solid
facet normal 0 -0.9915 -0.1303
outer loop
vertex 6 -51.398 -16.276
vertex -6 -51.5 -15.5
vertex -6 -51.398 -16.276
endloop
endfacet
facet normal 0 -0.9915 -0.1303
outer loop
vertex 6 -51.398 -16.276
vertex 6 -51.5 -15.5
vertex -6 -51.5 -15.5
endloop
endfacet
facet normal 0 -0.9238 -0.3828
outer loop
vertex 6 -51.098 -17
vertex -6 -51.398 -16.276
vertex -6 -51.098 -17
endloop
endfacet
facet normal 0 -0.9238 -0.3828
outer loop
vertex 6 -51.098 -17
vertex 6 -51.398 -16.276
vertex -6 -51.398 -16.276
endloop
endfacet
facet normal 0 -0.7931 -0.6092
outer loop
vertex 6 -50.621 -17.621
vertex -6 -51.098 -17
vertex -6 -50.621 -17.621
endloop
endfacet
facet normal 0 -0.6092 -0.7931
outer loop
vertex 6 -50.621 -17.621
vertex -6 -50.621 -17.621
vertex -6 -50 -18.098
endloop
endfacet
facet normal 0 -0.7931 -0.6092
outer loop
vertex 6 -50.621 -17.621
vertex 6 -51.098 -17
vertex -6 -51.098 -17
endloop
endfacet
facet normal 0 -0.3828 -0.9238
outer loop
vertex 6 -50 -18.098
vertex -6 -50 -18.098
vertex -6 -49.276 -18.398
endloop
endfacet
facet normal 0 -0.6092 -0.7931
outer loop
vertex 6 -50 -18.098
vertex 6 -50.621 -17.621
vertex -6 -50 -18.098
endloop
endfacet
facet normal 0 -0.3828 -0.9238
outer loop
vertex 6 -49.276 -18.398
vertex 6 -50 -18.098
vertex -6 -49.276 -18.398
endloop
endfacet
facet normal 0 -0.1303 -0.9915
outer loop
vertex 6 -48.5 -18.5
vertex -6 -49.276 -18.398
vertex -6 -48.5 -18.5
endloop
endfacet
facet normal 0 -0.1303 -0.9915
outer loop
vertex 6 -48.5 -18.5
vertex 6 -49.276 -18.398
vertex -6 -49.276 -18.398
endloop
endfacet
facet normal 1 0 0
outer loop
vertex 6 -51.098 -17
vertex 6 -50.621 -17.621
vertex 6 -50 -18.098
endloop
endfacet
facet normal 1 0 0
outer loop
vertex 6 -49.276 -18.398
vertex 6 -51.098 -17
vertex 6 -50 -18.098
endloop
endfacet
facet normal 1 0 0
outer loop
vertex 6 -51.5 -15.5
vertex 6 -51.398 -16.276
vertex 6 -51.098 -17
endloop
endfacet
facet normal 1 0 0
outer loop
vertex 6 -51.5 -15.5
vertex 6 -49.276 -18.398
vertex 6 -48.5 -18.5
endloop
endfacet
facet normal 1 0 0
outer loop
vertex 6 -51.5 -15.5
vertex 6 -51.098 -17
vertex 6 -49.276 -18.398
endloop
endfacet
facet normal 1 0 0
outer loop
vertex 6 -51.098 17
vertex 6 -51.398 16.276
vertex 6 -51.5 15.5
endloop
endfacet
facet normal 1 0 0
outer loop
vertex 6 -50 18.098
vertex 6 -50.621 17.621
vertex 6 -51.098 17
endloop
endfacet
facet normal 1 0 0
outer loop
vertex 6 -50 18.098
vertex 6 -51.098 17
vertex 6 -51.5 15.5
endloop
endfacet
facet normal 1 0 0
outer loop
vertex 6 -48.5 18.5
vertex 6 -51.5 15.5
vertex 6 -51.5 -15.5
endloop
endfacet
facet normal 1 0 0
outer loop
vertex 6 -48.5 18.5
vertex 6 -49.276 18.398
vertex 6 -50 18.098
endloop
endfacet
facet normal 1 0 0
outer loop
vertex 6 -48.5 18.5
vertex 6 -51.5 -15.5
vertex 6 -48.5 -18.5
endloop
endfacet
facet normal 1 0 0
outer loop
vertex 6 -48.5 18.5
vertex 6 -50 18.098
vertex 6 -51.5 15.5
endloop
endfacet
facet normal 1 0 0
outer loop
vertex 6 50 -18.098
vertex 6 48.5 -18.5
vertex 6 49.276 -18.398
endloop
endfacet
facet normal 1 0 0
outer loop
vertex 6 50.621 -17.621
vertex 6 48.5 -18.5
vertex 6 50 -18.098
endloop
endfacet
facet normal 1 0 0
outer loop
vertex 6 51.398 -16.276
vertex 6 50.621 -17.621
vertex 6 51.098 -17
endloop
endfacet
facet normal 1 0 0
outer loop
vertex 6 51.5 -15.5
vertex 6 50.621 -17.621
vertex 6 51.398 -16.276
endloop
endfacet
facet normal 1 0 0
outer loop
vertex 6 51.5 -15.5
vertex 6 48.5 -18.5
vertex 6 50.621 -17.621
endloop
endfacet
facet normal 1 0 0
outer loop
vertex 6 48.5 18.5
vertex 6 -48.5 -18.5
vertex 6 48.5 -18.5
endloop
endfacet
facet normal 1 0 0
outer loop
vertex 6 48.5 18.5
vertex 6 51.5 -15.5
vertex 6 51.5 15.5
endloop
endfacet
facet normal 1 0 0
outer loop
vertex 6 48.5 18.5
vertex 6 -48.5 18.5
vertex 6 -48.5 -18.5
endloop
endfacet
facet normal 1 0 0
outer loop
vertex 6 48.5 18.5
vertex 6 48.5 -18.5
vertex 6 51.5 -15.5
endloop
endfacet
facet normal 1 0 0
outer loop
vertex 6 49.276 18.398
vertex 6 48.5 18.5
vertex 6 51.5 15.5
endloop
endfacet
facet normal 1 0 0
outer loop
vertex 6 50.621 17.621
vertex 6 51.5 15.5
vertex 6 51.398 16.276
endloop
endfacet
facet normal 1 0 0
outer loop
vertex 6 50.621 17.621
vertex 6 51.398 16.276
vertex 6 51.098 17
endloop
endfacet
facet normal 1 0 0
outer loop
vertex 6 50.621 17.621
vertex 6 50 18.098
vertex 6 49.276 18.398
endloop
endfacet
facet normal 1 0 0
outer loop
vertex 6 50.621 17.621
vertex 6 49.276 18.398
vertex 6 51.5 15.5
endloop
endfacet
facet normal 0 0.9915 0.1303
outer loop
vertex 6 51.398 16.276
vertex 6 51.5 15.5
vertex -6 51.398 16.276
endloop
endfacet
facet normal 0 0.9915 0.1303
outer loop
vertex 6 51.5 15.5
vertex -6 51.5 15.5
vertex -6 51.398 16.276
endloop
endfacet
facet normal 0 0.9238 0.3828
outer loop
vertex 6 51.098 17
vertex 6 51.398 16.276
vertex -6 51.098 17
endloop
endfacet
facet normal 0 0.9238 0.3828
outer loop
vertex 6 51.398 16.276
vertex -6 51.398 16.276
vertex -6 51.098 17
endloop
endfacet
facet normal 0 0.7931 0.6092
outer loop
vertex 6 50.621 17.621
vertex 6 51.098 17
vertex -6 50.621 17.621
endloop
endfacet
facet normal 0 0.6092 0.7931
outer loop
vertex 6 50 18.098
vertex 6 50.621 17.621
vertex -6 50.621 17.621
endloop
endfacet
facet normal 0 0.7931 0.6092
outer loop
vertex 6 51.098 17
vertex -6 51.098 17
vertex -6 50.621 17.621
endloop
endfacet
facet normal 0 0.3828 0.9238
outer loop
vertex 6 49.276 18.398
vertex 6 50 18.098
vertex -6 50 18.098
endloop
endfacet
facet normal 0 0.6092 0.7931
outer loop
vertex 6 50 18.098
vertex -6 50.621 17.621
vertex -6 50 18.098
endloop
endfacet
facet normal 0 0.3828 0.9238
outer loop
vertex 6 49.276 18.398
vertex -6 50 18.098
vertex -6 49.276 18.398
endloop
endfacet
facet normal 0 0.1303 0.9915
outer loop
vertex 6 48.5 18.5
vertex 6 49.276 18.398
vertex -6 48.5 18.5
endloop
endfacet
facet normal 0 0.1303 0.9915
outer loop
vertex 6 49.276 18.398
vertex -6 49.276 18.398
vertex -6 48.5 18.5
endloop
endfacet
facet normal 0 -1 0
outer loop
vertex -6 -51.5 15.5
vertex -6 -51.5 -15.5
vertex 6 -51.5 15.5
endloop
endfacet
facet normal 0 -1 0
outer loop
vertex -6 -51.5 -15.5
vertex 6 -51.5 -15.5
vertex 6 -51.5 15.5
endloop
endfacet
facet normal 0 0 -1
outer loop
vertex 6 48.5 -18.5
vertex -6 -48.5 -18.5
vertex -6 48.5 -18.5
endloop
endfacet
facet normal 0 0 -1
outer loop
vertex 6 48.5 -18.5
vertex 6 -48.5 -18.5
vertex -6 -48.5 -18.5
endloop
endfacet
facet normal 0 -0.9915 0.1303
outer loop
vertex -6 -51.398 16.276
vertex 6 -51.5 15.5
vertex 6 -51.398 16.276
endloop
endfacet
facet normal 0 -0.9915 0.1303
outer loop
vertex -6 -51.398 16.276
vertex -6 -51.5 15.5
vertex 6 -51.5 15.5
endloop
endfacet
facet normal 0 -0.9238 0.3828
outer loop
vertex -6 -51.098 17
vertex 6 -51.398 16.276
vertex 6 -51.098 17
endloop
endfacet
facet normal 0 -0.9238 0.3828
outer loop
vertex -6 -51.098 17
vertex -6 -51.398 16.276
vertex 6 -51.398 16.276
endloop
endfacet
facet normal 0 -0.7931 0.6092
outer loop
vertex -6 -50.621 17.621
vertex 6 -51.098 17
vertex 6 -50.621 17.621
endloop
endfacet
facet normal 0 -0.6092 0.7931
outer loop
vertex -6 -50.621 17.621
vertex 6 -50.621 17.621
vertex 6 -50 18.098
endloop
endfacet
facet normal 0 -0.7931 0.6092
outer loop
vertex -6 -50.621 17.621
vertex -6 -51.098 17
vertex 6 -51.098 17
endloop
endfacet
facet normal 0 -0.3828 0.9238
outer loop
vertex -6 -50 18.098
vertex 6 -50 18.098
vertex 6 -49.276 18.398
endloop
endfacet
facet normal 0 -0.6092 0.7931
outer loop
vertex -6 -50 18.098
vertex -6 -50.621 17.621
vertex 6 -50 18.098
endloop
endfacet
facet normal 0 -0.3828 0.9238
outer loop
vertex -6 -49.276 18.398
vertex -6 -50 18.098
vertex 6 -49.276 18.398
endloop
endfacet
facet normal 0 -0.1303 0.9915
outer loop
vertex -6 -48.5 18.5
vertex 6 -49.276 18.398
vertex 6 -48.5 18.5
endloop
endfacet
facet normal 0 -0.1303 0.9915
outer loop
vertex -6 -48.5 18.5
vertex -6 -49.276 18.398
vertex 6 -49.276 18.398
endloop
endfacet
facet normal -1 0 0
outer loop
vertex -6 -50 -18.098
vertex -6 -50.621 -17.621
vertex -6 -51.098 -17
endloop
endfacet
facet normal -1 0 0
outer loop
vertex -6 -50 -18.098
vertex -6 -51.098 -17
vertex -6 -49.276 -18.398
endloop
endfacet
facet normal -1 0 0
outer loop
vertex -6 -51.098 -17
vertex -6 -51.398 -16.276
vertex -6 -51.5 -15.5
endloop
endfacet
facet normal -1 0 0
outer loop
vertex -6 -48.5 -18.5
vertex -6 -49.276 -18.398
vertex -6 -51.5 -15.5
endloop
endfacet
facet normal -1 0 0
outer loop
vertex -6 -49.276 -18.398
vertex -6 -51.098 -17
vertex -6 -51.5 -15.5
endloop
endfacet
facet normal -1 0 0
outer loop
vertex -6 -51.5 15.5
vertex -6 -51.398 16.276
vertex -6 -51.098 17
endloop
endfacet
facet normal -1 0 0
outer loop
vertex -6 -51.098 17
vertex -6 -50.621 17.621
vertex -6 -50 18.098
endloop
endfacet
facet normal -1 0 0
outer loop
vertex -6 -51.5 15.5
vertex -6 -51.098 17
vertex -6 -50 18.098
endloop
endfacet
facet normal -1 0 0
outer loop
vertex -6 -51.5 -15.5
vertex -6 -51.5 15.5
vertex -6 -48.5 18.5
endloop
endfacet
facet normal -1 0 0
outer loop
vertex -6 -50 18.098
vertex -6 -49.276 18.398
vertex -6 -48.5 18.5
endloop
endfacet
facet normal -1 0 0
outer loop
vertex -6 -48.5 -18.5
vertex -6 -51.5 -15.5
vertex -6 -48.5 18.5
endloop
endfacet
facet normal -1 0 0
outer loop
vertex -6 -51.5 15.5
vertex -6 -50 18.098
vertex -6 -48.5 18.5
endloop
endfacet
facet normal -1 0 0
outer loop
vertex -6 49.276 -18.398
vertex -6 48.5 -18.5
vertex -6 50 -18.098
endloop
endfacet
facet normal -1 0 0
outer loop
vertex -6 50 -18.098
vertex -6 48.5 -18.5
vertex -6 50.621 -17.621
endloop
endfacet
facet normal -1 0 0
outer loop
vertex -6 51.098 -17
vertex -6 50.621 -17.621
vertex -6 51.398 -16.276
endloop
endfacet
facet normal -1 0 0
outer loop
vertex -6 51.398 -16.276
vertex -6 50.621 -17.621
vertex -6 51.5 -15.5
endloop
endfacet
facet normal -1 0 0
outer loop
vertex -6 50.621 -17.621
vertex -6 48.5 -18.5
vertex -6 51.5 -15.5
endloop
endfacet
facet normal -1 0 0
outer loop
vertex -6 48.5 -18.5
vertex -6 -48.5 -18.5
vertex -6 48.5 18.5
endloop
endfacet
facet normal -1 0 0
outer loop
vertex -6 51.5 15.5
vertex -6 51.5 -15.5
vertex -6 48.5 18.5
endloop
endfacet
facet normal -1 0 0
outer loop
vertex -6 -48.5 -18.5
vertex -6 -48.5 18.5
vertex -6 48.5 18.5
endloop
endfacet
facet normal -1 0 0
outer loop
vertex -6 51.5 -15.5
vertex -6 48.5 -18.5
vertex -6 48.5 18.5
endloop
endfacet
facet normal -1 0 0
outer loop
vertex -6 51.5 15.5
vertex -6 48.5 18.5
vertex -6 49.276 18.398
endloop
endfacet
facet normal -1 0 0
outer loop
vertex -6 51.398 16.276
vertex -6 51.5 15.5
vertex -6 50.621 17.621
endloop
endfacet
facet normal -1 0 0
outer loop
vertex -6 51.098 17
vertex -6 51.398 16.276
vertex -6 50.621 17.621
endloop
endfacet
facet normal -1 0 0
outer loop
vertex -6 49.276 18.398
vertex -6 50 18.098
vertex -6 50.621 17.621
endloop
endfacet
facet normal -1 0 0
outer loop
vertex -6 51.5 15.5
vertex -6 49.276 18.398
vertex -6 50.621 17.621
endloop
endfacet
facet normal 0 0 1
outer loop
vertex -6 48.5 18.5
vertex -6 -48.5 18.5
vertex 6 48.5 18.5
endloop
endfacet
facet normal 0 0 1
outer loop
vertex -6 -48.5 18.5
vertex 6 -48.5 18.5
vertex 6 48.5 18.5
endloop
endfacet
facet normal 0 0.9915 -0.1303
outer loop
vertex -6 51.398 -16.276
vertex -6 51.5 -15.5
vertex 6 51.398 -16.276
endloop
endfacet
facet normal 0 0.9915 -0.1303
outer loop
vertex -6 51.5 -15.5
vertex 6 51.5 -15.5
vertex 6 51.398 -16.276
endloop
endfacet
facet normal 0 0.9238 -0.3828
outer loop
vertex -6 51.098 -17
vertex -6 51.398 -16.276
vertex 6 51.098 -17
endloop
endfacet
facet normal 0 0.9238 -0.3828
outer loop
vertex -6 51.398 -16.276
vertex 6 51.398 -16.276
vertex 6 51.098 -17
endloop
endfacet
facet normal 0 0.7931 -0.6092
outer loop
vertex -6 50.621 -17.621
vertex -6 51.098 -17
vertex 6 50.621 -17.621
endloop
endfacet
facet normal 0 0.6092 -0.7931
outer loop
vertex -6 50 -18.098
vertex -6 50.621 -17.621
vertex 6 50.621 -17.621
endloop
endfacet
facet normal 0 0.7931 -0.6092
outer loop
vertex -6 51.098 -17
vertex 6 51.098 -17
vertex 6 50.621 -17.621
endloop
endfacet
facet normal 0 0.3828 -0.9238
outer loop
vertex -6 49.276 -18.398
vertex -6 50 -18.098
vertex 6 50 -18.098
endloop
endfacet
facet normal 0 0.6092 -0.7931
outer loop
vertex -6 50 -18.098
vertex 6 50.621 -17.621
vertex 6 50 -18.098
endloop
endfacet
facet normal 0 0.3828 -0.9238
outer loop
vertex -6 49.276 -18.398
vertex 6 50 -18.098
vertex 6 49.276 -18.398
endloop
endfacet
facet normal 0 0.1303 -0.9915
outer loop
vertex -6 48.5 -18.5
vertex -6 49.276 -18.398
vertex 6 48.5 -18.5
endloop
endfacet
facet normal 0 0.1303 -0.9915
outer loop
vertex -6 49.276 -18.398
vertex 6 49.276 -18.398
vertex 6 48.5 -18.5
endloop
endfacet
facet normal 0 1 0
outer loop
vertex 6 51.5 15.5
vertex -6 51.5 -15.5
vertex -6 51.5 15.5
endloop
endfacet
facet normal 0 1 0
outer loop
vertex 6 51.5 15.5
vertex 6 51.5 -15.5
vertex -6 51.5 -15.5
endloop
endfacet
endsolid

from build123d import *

# Parameters (mm, degrees)
F0_W     = 103
F0_H     = 37
F1_DEPTH = 6
F2_R     = 3


with BuildPart() as f1:
    # F0 (on Right) → F1 (new body, symmetric)
    with BuildSketch(Plane.YZ):
        Rectangle(F0_W, F0_H)
    extrude(amount=F1_DEPTH, both=True)

    # F2
    f2_edges = [f1.edges().sort_by_distance(p)[0] for p in [
        (0, -51.5, 18.5),
        (0, -51.5, -18.5),
        (0, 51.5, -18.5),
        (0, 51.5, 18.5),
    ]]
    fillet(f2_edges, radius=F2_R)


solid = f1.part
